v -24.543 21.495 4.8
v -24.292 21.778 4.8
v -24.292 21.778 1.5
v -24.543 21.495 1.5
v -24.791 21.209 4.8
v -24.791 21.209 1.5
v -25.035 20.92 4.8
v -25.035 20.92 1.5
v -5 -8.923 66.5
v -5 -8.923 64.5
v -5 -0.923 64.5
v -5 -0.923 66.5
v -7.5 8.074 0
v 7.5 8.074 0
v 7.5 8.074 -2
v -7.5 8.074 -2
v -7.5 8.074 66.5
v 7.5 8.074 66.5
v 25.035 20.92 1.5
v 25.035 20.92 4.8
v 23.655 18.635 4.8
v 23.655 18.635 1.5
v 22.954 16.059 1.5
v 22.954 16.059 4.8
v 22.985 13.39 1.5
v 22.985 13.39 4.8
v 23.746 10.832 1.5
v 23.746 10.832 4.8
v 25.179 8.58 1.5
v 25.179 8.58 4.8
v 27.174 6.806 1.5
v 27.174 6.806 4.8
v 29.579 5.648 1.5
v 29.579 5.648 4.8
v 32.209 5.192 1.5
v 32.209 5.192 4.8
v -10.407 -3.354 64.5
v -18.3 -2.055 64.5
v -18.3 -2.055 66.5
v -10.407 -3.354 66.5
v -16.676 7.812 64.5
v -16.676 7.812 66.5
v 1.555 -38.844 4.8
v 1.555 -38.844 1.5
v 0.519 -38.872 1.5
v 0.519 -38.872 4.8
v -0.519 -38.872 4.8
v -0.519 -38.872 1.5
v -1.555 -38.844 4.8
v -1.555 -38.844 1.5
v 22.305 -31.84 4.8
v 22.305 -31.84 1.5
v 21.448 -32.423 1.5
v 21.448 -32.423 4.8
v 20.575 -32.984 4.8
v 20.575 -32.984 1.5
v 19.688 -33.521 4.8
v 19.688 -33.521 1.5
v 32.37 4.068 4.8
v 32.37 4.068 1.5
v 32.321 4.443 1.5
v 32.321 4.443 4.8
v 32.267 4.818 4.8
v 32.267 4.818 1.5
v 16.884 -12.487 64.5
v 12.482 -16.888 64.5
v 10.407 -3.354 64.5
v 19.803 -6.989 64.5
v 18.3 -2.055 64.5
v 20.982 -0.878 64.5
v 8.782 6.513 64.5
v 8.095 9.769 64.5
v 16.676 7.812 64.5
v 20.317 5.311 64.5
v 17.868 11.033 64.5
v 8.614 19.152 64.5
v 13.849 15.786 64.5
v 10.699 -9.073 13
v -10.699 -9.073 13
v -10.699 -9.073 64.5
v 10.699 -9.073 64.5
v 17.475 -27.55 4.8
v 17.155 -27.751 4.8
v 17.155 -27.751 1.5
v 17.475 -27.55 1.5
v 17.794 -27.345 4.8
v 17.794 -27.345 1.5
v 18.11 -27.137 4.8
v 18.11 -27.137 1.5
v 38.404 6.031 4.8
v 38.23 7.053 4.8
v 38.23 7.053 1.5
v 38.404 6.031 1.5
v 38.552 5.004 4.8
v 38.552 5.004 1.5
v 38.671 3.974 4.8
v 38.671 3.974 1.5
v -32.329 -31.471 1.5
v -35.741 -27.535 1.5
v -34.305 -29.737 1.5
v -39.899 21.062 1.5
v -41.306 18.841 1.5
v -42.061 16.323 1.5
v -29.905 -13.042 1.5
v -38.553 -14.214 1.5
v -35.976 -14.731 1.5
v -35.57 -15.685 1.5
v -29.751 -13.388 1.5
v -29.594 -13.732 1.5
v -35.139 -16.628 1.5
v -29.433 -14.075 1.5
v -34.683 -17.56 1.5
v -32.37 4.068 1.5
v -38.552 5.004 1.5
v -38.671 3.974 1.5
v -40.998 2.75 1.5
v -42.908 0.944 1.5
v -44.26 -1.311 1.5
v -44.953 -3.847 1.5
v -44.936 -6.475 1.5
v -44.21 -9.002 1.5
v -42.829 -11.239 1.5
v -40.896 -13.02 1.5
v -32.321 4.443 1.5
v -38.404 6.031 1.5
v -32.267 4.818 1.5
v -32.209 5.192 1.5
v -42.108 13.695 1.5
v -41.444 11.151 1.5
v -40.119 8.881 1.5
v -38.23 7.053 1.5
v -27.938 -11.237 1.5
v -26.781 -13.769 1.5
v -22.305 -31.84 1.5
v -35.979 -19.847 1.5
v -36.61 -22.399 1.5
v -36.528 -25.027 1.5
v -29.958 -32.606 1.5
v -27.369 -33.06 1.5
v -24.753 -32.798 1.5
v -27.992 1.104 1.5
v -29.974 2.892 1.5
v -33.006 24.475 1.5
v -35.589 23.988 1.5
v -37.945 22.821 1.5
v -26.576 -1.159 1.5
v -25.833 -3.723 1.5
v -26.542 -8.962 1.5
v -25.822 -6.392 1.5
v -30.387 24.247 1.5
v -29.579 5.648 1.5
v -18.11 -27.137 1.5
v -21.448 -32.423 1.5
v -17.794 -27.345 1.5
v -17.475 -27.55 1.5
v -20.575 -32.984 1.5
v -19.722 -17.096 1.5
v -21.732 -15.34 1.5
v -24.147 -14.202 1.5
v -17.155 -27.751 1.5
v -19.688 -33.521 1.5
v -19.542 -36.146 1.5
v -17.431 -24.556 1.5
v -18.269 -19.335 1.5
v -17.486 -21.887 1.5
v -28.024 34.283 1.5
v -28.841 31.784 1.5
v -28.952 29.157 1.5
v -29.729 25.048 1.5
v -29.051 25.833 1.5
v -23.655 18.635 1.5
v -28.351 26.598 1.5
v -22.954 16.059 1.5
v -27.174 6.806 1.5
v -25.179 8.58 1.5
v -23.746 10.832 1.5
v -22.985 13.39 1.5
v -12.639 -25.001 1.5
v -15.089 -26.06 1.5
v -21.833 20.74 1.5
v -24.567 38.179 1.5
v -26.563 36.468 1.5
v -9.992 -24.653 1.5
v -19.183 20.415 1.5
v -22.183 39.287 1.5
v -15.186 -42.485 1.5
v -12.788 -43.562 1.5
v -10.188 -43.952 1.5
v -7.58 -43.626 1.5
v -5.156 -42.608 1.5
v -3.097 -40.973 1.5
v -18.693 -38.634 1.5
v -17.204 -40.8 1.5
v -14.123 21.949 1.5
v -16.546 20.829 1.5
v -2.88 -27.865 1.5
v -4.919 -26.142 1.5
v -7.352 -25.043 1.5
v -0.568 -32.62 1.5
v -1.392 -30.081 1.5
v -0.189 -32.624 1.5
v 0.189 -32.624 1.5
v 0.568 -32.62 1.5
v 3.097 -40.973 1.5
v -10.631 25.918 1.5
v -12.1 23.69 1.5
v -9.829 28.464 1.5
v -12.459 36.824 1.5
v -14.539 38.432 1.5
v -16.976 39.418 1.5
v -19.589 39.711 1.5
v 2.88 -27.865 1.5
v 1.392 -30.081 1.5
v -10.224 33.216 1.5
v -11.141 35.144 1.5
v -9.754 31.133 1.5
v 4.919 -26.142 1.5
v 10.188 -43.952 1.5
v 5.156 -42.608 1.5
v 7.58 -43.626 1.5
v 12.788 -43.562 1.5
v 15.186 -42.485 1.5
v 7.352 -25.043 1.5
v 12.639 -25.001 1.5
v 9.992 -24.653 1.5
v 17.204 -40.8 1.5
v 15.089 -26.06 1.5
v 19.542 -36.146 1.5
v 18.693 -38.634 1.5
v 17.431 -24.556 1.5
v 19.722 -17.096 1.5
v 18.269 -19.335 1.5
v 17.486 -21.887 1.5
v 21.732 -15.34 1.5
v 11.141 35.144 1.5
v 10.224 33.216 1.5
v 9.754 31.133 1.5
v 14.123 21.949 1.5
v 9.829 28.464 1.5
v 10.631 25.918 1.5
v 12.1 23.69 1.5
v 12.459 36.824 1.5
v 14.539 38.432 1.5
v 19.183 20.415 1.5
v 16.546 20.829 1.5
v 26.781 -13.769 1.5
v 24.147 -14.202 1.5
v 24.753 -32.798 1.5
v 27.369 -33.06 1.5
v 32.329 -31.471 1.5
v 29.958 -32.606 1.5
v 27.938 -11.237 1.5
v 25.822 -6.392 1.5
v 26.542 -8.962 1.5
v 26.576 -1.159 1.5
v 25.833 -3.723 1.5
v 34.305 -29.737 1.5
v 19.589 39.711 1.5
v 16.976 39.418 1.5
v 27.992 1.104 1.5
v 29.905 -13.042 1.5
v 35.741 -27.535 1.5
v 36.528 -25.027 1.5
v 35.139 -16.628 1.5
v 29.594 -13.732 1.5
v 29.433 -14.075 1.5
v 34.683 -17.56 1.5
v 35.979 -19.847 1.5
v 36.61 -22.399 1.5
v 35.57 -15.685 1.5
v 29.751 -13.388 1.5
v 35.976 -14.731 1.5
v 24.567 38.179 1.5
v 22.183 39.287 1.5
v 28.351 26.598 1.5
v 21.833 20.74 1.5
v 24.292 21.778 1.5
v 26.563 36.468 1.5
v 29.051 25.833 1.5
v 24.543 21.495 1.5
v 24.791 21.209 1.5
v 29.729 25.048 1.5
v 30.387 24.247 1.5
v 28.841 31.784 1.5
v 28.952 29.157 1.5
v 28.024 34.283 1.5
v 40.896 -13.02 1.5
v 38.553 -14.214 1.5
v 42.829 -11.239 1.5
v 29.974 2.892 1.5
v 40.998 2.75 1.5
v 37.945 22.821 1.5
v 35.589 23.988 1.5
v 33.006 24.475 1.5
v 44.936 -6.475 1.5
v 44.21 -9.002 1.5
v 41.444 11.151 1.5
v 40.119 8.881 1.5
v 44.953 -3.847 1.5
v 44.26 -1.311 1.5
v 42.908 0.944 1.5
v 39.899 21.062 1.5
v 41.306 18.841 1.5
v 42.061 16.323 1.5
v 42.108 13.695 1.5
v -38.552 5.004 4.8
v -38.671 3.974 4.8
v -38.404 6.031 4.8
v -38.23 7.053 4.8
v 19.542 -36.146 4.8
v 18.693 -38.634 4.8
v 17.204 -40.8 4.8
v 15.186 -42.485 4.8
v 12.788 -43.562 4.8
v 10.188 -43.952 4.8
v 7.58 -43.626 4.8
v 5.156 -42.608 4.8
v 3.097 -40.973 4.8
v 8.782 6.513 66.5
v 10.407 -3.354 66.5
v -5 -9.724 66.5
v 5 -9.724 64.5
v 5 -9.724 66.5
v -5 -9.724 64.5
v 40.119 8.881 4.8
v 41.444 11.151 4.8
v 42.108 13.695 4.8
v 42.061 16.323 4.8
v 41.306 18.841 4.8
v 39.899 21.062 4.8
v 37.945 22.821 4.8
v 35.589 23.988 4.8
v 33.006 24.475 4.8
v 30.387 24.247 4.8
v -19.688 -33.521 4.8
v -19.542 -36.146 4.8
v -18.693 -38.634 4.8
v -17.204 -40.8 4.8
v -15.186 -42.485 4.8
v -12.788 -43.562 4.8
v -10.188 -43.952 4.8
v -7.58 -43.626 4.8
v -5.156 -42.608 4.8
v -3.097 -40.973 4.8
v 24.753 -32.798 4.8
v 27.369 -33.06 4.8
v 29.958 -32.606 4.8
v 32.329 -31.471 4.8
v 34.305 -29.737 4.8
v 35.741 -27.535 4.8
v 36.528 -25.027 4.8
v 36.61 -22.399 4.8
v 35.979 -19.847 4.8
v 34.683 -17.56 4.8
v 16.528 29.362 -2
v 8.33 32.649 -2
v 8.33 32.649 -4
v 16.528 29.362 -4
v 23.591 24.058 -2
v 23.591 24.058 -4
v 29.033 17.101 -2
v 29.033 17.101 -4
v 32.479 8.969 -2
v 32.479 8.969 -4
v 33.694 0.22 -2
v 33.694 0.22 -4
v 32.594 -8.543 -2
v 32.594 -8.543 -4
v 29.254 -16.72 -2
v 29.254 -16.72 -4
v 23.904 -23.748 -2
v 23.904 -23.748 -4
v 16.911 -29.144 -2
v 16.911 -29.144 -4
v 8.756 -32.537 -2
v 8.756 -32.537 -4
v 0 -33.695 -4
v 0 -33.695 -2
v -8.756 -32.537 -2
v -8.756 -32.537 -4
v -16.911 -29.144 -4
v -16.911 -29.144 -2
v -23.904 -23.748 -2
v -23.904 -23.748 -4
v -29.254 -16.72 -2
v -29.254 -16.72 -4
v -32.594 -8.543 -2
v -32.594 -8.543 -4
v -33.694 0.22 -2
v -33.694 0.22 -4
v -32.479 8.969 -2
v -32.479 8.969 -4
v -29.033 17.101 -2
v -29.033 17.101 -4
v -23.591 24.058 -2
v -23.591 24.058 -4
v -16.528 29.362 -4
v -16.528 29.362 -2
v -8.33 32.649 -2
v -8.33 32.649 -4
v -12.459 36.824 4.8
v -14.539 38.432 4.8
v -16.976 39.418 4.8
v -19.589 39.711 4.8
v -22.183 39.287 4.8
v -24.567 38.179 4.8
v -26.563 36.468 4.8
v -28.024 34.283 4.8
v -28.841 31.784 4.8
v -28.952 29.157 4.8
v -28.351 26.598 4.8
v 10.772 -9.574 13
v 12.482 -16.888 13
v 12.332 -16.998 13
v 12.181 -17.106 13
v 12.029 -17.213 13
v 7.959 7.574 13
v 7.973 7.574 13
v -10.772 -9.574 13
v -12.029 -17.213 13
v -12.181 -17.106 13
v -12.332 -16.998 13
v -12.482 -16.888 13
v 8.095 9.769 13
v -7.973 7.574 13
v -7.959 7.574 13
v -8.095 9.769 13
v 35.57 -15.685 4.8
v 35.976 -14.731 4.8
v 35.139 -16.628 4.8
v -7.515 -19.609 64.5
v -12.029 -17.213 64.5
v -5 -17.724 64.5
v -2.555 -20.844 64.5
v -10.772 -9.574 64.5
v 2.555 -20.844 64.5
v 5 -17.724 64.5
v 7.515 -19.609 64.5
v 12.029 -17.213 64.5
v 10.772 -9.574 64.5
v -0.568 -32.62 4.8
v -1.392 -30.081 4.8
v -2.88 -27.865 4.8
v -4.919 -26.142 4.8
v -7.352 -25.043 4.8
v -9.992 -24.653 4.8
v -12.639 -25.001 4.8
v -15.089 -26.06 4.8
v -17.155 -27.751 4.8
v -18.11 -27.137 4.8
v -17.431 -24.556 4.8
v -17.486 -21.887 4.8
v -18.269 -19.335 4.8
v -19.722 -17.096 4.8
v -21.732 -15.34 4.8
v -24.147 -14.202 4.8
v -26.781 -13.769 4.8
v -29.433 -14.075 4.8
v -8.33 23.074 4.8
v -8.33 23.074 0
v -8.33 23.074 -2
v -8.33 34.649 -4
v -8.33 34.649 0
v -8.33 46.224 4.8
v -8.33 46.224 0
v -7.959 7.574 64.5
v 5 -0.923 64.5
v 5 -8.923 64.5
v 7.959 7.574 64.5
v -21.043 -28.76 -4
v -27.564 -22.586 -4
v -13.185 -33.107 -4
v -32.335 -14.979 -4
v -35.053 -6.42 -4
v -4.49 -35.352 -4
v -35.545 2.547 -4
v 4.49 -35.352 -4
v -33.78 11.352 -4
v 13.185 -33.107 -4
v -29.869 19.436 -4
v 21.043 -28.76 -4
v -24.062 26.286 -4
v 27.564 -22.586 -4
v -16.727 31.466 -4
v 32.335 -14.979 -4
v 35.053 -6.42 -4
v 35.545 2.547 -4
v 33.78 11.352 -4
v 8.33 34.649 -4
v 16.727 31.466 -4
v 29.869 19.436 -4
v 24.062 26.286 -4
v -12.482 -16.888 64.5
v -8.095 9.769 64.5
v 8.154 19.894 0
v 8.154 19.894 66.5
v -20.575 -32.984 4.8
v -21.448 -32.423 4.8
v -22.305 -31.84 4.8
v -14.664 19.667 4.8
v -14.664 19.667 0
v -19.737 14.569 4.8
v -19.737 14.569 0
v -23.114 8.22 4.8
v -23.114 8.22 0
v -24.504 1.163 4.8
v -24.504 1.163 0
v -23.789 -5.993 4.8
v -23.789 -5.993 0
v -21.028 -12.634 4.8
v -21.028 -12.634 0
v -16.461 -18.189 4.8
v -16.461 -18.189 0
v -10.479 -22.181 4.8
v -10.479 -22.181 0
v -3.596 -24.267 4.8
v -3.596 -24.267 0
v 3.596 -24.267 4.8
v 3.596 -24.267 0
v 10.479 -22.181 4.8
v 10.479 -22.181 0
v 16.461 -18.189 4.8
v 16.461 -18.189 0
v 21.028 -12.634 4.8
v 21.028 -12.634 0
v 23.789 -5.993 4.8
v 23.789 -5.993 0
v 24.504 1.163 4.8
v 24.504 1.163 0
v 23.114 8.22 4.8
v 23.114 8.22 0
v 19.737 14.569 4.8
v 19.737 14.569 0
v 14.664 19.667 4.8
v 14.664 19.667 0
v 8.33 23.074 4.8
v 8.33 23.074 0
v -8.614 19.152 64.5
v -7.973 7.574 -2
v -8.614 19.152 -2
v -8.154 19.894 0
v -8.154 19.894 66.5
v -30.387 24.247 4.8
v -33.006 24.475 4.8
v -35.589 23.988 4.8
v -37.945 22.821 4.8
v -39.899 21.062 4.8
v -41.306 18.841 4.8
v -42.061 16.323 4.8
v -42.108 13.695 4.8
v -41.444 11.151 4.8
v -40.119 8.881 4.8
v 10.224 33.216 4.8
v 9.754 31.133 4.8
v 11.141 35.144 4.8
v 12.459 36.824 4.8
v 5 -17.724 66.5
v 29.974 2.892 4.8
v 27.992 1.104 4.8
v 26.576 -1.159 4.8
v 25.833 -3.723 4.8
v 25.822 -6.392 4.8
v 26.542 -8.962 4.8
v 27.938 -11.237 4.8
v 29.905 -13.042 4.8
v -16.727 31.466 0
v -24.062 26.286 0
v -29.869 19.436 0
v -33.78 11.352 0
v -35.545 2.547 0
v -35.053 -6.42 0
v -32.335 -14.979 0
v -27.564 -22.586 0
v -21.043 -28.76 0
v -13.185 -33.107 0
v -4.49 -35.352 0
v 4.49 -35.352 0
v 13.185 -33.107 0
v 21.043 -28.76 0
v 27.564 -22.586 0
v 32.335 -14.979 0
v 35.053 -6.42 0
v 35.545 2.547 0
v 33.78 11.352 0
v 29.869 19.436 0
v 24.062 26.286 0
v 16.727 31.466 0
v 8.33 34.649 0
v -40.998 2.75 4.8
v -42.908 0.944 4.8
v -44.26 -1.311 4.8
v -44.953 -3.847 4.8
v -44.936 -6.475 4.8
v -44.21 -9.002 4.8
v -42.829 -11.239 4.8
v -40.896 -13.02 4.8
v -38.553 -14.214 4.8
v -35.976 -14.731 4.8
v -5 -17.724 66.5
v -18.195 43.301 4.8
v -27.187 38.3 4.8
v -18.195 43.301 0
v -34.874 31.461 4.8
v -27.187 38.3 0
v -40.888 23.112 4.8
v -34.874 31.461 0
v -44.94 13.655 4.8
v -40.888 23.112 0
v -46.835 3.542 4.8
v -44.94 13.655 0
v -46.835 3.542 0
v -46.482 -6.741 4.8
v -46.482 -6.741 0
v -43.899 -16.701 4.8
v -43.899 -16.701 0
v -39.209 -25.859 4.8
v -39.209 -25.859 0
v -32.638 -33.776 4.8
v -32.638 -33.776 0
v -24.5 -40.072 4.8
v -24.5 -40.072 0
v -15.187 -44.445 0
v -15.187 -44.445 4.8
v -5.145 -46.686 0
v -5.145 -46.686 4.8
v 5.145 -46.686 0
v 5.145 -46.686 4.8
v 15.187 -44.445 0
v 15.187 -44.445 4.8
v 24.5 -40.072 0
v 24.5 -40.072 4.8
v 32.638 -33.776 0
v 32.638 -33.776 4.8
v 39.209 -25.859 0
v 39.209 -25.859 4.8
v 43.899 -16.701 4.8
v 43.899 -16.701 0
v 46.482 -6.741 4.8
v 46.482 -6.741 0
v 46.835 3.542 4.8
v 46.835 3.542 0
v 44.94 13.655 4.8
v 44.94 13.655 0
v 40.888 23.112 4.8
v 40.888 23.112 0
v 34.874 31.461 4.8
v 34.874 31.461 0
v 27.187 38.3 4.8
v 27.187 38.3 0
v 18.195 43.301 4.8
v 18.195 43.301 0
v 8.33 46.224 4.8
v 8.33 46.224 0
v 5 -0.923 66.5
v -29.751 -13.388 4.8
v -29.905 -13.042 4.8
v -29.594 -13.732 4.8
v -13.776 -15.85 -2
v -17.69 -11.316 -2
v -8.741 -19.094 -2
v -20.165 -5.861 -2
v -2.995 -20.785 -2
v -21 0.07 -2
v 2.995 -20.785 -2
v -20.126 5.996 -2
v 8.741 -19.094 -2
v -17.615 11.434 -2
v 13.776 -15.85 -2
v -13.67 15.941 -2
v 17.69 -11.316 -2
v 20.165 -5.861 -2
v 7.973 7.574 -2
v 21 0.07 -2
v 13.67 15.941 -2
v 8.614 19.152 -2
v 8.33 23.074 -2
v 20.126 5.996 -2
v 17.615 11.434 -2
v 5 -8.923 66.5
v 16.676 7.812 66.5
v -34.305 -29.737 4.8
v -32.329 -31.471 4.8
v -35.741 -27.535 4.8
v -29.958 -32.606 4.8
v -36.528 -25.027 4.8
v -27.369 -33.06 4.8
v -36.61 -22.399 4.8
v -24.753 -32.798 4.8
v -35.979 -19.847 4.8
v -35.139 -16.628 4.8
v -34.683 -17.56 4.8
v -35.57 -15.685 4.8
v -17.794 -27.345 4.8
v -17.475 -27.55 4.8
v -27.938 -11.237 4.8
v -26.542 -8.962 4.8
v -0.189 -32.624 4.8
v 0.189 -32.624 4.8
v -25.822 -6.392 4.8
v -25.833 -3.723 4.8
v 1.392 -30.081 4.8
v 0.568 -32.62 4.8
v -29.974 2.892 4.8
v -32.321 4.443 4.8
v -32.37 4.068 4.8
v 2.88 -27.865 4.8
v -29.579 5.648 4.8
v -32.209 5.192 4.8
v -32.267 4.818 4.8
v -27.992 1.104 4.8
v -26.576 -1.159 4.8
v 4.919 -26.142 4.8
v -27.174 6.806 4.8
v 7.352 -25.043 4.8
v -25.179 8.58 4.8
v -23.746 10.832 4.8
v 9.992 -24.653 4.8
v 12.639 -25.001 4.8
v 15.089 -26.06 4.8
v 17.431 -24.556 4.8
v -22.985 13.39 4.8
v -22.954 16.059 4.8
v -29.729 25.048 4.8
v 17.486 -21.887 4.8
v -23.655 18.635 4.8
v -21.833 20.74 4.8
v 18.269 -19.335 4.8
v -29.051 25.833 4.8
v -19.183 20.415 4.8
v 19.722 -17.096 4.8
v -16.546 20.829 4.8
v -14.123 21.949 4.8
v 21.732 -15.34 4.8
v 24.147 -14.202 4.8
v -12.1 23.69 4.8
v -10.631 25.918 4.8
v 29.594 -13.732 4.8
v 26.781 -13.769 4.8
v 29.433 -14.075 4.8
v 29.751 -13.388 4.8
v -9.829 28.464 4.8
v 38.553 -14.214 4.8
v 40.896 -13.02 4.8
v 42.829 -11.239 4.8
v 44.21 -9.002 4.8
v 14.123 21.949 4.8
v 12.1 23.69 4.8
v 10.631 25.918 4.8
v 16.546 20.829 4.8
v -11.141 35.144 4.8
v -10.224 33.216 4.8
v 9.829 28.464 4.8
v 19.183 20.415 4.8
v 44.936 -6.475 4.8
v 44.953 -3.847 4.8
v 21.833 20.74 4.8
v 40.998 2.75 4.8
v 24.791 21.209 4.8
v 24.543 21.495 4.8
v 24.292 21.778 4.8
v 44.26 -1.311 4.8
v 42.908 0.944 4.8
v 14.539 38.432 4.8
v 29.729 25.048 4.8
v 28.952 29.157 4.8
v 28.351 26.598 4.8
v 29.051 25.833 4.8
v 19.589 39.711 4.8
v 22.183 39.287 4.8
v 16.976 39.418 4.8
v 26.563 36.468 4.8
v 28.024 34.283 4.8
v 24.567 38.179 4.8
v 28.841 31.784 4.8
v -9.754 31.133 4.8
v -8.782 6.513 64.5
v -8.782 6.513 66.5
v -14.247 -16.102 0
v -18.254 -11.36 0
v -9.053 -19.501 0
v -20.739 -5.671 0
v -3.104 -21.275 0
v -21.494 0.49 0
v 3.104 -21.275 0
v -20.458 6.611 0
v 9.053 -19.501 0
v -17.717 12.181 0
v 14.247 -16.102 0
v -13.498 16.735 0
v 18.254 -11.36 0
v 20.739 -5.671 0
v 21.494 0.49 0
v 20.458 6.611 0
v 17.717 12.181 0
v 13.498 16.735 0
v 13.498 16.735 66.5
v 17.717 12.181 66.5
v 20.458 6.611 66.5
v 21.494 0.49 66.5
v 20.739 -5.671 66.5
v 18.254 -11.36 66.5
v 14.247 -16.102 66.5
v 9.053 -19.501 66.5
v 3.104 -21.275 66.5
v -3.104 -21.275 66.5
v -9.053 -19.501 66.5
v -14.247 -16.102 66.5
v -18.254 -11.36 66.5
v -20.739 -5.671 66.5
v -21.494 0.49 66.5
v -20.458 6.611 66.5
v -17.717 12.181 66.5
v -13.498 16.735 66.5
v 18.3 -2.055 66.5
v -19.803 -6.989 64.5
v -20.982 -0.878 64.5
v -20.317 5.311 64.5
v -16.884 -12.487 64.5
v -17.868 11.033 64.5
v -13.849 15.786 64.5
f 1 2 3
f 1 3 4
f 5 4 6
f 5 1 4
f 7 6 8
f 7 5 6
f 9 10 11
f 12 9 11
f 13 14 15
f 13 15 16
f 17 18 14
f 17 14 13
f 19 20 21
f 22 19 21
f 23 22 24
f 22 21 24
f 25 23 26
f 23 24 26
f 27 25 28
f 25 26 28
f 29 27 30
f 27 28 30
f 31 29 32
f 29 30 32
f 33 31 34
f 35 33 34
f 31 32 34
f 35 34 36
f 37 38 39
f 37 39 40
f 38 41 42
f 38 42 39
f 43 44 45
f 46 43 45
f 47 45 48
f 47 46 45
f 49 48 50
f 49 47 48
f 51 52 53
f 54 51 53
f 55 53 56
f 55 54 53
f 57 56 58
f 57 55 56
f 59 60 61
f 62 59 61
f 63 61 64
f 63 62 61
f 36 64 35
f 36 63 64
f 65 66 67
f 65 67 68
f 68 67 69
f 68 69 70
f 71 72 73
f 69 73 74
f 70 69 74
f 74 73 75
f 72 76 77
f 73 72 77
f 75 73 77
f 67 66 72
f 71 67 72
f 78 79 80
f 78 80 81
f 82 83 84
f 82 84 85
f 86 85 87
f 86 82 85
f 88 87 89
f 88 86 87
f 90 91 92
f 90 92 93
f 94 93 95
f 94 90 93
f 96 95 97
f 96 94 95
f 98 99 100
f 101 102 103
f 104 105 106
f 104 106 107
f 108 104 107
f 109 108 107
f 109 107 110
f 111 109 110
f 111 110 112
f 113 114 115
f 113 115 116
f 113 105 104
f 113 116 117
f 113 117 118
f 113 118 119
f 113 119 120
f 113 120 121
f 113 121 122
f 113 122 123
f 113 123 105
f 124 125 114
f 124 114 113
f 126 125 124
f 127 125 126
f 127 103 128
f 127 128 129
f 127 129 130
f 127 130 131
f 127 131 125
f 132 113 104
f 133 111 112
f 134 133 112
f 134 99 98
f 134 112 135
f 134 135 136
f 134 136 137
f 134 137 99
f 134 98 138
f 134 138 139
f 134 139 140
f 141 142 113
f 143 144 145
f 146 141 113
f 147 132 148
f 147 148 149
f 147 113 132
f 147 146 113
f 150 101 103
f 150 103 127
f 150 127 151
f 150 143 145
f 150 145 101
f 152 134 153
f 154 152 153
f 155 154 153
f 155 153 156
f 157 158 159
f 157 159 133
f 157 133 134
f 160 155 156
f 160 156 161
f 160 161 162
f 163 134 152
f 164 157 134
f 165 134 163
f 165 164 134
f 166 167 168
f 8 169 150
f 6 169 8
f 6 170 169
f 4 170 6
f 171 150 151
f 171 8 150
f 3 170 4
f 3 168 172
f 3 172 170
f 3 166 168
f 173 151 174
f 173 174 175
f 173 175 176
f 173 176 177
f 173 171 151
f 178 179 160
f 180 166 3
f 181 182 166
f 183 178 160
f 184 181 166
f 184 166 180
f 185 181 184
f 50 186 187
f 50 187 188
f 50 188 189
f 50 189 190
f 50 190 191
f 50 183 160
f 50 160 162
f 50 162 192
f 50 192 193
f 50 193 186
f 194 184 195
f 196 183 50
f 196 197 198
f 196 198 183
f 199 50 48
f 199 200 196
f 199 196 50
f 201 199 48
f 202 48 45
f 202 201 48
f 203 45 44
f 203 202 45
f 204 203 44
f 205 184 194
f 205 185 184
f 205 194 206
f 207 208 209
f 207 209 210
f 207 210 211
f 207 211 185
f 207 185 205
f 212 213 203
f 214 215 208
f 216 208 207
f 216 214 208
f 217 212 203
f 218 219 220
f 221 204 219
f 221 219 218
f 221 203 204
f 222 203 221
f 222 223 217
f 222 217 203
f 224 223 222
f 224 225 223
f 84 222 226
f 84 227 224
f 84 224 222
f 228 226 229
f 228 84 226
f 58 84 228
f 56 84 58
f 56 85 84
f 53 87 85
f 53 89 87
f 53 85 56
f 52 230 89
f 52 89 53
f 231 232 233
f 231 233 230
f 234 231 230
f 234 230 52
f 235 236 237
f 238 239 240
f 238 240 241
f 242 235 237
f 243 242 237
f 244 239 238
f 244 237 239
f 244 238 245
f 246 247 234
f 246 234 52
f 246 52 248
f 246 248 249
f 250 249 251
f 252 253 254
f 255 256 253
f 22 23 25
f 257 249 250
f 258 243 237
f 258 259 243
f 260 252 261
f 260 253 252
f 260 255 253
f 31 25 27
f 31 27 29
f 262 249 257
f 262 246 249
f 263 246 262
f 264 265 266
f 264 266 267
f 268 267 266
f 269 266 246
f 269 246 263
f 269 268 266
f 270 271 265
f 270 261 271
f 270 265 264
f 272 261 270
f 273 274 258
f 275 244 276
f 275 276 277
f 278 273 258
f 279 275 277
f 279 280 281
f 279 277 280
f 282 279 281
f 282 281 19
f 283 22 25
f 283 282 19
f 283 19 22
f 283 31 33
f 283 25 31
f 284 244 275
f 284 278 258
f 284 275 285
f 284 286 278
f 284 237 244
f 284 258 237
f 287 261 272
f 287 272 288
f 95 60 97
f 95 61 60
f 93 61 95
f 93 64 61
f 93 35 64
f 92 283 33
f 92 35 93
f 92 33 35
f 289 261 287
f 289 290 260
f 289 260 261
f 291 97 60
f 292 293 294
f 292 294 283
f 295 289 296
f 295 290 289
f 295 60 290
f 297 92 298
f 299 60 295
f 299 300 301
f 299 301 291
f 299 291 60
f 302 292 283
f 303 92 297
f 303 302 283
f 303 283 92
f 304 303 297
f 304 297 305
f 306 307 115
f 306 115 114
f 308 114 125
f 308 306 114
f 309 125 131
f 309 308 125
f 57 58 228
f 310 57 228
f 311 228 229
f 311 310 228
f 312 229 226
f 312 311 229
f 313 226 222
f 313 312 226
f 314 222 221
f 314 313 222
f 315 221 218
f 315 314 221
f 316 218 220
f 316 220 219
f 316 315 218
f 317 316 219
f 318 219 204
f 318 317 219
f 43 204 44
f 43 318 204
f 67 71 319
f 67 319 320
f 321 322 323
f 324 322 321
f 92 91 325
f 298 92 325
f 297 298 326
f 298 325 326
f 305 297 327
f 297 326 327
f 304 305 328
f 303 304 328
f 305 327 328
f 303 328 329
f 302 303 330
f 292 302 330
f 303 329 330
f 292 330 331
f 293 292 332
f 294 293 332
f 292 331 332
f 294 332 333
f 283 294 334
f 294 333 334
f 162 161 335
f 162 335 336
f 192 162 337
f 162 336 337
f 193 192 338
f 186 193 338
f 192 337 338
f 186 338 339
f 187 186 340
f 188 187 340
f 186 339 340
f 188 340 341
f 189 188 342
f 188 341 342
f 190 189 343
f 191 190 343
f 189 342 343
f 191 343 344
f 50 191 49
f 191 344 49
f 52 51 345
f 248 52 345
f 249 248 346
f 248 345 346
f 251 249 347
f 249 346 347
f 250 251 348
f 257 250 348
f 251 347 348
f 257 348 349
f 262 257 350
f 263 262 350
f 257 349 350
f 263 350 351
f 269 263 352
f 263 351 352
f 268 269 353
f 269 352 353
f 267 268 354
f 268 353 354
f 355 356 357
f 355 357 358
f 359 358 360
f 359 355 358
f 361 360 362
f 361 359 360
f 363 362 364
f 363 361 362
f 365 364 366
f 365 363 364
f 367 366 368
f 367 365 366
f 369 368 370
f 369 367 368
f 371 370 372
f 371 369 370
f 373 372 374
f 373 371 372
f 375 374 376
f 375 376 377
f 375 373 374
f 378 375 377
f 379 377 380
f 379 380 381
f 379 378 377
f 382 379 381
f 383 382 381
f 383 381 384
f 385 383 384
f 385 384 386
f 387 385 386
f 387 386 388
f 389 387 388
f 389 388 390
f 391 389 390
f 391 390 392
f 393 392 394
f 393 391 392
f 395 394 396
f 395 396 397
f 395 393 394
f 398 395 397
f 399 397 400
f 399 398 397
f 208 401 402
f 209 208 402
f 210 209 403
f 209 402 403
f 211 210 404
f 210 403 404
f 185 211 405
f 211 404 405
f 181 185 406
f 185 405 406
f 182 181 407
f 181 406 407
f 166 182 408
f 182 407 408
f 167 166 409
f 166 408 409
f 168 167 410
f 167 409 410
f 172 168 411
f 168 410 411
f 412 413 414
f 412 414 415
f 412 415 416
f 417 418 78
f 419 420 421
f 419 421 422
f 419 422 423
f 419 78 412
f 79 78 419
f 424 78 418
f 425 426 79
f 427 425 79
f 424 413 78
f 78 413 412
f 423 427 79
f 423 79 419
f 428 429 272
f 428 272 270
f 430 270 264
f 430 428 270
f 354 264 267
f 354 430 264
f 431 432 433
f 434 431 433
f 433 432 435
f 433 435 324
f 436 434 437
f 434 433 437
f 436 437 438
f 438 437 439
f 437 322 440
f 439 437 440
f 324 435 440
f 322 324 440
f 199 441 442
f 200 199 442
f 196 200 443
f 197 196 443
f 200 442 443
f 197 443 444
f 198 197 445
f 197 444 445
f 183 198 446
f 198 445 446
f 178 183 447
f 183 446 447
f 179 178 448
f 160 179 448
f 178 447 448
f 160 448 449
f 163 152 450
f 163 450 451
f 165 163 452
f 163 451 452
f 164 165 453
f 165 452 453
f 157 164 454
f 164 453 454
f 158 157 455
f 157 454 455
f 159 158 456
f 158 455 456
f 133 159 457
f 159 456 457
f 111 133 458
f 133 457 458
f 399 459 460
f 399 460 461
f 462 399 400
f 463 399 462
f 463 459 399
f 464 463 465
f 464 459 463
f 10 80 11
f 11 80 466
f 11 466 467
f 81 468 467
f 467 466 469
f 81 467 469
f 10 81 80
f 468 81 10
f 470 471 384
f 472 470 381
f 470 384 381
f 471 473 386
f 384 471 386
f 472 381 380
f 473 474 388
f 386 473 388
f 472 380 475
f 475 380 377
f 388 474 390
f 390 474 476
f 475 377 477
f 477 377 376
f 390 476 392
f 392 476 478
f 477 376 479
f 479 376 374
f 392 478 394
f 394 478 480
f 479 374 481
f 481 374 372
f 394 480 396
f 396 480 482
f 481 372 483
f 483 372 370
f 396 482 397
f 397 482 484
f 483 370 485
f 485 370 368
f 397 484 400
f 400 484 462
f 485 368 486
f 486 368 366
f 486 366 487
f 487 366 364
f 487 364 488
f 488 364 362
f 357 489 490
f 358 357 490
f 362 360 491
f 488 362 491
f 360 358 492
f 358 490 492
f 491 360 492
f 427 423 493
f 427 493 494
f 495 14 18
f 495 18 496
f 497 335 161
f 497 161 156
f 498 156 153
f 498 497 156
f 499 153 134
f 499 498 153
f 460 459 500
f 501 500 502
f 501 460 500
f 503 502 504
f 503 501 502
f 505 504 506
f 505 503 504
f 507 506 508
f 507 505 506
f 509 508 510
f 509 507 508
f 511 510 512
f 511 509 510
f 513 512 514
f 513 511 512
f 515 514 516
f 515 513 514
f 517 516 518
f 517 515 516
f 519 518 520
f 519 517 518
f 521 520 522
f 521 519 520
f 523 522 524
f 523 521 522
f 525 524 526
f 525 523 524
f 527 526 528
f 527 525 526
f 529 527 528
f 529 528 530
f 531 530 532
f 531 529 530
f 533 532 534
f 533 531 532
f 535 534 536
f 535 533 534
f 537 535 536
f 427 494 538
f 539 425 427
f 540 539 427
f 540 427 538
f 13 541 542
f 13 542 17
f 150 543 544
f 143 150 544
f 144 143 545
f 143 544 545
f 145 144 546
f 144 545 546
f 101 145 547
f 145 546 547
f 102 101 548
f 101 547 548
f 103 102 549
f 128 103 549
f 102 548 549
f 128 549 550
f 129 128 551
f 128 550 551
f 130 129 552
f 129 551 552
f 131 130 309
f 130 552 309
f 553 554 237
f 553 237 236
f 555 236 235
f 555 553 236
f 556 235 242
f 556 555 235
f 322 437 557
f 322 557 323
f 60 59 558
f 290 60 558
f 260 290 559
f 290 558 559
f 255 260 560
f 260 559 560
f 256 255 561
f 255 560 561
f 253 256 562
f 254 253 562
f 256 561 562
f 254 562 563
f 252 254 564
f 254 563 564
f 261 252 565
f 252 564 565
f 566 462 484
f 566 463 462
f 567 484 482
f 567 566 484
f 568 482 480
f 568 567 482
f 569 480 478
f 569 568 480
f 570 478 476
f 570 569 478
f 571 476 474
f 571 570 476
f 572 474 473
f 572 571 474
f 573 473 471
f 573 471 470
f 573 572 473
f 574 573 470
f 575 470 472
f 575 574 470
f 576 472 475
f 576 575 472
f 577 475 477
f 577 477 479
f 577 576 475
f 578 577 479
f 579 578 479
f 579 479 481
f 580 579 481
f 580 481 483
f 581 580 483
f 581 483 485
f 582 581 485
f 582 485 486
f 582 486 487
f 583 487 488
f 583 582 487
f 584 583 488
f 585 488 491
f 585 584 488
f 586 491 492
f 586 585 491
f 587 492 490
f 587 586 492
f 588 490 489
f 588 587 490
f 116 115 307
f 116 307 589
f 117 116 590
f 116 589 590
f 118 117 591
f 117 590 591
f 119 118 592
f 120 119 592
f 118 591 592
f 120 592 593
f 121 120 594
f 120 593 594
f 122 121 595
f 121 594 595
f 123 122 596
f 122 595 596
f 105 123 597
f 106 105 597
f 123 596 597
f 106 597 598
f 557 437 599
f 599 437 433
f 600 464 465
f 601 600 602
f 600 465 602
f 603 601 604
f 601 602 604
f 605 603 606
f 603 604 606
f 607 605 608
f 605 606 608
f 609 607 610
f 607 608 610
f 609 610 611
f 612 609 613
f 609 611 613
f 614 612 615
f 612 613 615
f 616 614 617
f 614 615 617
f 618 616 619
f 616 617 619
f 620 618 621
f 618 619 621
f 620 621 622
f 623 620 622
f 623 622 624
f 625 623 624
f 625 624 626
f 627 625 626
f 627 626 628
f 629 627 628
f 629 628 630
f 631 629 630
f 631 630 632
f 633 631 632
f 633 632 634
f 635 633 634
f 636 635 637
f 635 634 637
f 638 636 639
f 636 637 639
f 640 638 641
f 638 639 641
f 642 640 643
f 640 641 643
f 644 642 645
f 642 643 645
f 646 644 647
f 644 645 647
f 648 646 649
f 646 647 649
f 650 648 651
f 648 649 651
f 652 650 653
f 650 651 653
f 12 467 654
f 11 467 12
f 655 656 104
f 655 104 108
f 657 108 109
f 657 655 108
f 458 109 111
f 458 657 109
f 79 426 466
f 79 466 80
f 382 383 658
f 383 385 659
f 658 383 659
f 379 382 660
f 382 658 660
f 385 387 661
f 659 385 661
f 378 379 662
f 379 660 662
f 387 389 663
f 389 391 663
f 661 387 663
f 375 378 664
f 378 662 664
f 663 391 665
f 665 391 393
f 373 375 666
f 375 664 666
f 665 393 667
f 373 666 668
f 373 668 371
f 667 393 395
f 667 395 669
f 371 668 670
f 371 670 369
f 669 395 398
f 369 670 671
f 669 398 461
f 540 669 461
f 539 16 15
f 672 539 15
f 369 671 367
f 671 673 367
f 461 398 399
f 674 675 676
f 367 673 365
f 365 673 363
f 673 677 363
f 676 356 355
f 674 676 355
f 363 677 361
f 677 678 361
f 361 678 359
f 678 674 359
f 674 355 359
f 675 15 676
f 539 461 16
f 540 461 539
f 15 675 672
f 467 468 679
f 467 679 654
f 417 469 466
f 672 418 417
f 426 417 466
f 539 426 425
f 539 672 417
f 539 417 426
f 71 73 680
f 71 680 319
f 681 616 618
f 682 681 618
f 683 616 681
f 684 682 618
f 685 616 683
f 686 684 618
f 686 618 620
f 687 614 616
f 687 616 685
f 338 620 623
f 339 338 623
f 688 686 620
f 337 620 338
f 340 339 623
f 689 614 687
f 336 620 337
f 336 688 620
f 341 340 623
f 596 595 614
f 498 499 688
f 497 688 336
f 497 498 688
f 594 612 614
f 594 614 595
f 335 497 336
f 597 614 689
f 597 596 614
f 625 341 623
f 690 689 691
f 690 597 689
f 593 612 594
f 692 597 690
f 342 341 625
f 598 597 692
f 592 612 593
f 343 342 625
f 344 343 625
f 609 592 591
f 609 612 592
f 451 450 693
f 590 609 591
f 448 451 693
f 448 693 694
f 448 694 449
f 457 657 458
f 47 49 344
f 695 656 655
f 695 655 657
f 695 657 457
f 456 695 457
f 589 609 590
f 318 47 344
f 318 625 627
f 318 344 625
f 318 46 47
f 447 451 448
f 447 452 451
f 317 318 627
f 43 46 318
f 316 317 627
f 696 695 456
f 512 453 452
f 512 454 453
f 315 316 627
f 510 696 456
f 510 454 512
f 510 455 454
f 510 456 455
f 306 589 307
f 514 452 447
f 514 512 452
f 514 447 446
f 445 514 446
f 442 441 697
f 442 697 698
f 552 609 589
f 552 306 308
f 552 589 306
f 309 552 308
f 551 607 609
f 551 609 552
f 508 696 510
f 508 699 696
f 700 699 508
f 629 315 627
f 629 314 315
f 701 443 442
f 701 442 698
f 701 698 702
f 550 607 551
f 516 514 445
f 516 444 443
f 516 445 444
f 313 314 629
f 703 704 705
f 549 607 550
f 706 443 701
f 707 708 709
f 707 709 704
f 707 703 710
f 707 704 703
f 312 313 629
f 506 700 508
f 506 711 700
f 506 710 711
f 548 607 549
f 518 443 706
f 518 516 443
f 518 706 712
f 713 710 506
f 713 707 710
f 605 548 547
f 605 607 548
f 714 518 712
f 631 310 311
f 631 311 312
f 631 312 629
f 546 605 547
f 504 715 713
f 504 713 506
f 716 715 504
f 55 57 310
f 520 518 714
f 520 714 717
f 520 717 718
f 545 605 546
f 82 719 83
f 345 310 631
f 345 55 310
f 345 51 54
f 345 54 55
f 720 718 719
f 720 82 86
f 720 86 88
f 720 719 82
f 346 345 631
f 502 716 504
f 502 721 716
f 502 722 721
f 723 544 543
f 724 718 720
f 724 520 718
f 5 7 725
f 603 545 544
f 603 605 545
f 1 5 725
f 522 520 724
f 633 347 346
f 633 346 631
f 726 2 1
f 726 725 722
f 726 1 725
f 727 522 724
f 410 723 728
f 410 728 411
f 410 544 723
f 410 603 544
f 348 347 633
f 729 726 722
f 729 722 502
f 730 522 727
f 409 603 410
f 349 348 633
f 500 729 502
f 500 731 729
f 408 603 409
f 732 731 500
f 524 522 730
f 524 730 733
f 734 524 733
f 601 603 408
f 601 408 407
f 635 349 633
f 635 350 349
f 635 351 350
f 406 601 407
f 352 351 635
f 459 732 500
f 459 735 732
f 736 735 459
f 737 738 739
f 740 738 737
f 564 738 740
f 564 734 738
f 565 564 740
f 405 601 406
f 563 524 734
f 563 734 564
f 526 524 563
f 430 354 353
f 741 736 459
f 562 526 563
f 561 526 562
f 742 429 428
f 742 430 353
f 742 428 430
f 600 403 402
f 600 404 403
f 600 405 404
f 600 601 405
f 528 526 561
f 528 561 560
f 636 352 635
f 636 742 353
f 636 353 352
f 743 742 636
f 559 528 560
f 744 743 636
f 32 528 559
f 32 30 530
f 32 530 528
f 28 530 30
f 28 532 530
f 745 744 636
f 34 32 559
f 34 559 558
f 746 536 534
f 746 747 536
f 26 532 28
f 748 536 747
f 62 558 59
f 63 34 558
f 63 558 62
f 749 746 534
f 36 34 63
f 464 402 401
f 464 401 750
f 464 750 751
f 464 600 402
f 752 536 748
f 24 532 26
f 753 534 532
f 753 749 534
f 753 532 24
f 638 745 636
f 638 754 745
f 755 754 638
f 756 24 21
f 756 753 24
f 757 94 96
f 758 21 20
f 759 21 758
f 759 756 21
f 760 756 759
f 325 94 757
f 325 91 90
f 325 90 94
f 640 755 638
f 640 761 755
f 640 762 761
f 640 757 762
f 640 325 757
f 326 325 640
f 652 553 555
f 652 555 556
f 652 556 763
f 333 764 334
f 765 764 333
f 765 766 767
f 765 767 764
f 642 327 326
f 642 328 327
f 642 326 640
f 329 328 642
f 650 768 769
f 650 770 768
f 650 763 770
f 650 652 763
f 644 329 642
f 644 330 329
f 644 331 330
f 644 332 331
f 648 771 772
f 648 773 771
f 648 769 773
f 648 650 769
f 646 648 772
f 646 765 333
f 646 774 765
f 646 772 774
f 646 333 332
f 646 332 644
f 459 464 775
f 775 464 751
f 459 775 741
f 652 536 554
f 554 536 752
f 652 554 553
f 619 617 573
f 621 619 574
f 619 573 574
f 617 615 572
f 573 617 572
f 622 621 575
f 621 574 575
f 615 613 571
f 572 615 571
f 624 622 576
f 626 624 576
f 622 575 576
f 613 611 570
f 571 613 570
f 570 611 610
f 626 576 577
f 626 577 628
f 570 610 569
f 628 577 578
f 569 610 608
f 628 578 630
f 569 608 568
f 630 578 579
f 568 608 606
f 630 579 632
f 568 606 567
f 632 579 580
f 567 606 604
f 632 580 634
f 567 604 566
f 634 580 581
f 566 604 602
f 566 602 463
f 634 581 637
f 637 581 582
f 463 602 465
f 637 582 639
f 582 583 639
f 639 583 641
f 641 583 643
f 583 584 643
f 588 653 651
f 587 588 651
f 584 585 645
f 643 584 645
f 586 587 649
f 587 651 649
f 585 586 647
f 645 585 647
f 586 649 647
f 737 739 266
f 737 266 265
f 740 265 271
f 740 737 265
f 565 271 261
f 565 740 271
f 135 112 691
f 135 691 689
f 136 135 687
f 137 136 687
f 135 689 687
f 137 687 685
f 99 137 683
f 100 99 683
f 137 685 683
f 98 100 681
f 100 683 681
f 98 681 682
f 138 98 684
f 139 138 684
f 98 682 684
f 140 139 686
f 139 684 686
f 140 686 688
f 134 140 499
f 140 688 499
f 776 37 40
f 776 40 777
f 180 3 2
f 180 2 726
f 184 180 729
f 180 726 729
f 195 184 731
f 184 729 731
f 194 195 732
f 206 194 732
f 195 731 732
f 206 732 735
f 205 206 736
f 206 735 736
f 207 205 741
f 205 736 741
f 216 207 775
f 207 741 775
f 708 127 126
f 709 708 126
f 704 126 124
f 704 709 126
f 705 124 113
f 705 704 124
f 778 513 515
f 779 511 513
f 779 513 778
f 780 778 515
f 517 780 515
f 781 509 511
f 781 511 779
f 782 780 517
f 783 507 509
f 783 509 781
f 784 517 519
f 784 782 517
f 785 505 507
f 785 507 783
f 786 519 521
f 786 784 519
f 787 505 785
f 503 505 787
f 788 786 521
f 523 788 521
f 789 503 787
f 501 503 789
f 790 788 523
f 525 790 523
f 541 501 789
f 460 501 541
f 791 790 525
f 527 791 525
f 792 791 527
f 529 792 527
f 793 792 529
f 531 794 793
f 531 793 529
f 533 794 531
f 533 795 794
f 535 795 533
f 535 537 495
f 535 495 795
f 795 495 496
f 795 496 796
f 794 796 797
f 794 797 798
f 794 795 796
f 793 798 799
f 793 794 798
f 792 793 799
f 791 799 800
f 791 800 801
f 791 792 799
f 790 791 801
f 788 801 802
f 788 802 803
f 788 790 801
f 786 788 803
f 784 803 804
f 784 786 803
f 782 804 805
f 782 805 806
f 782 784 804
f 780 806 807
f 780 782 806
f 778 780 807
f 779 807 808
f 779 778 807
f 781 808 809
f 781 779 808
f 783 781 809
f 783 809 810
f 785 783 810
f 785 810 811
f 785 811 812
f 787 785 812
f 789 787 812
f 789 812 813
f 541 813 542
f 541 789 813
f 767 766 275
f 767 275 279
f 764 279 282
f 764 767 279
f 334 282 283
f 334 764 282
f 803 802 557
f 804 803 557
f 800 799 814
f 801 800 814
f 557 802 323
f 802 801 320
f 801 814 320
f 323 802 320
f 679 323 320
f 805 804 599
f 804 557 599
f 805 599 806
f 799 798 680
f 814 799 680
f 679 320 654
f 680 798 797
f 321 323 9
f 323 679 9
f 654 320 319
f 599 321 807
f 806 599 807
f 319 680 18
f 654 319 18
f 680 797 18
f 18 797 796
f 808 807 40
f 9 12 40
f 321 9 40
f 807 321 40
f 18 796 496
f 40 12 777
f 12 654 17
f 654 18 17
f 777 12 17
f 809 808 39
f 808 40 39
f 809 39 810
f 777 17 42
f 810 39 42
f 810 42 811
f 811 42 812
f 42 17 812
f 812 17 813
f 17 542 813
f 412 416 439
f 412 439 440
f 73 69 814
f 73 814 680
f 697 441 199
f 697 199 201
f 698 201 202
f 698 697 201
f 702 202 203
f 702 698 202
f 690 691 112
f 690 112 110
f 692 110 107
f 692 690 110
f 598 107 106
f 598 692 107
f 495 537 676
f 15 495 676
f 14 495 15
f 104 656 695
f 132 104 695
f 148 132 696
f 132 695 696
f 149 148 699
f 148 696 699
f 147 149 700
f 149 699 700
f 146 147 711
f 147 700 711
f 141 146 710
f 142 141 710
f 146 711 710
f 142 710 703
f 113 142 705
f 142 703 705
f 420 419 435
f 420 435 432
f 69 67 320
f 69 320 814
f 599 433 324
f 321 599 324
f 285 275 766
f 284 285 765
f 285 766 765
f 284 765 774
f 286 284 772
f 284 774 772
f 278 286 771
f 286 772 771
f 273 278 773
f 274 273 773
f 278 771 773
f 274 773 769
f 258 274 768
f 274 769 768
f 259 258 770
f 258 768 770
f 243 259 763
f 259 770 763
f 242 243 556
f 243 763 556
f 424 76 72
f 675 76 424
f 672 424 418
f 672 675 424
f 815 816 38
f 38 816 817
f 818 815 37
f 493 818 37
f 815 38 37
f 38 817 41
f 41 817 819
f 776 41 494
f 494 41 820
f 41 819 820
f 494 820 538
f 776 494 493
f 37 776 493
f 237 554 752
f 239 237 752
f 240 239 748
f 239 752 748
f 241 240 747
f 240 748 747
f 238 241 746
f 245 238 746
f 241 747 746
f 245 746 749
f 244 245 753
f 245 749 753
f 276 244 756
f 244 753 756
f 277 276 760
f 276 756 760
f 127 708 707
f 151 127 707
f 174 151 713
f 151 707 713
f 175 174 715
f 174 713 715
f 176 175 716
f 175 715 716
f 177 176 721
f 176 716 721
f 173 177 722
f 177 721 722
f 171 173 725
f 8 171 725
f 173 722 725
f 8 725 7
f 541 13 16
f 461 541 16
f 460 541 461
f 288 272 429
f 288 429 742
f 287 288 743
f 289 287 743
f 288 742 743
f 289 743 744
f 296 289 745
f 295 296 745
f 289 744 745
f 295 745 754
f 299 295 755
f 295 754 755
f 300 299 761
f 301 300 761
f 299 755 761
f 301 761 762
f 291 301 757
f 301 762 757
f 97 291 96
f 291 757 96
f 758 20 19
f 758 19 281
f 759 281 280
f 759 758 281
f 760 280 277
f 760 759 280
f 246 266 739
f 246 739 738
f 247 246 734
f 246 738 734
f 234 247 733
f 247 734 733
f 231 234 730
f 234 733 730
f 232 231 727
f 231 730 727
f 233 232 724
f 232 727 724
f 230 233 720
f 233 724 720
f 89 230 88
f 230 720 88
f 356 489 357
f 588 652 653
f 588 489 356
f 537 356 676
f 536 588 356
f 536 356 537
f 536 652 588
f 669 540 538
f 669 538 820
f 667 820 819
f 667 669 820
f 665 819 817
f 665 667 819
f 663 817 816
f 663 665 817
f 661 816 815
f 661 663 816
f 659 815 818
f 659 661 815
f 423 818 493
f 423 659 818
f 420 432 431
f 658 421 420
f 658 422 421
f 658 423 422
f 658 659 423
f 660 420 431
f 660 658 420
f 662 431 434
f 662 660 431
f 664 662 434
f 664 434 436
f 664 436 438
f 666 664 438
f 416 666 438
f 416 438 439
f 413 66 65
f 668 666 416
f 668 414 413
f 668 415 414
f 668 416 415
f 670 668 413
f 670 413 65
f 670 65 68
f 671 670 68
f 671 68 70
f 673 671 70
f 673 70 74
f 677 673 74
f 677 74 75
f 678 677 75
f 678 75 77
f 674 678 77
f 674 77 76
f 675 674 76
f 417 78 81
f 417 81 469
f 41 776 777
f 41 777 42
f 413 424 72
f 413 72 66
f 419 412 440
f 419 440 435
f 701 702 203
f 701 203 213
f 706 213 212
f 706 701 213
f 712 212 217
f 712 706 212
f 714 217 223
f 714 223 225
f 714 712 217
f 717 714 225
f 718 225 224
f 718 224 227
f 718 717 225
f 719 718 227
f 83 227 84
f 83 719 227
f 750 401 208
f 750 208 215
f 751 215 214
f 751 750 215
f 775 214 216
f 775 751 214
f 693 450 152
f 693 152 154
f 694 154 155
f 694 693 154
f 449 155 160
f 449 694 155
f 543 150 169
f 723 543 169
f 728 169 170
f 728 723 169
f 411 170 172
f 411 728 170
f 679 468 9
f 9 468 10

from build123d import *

# Parameters (mm, degrees)
BASIC_SHAPE_SKETCH_R                = 46.96825
BASIC_SHAPE_SKETCH_R_2              = 24.53175
BASIC_SHAPE_DEPTH                   = 4.8
BATTERY_SLOT_SKETCH_R               = 9.65
BATTERY_SLOT_DEPTH                  = 3.3
BATTERY_SLOT_PATTERN_COUNT          = 5
BATTERY_SLOT_PATTERN_ANGLE          = 130.88
BATTERY_SLOT_MIRROR_COPY_1_SKETCH_R = 9.65
BATTERY_SLOT_MIRROR_COPY_1_DEPTH    = 3.3
BATTERY_SLOT_MIRROR_COPY_2_SKETCH_R = 9.65
BATTERY_SLOT_MIRROR_COPY_2_DEPTH    = 3.3
BATTERY_SLOT_MIRROR_COPY_3_SKETCH_R = 9.65
BATTERY_SLOT_MIRROR_COPY_3_DEPTH    = 3.3
BATTERY_SLOT_MIRROR_COPY_4_SKETCH_R = 9.65
BATTERY_SLOT_MIRROR_COPY_4_DEPTH    = 3.3
SLIT_DEPTH                          = 67.596343865
BUS_SLIT_DEPTH                      = 3.3
CAP_2_DEPTH                         = 2
PLUNGER_DEPTH                       = 66.5
PLUNGER_CAVITY_DEPTH                = 66.5
LIP_DEPTH                           = 2
EXTRA_CUT_DEPTH                     = 94.990866663
BARRIERS_DEPTH                      = 51.5
SKETCH15_W                          = 10
SKETCH15_H                          = 8
CUT_EXTRUDE6_DEPTH                  = 96.416366605


with BuildPart() as part:
    # Basic_Shape_Sketch → Basic_Shape (new body)
    with BuildSketch(Plane.XY):
        Circle(BASIC_SHAPE_SKETCH_R)
        Circle(BASIC_SHAPE_SKETCH_R_2, mode=Mode.SUBTRACT)
    extrude(amount=BASIC_SHAPE_DEPTH)

    # Battery_Slot_Sketch → Battery_Slot (cut)
    with BuildSketch(Plane.XY.offset(4.8)):
        with Locations((-10.069761866, -34.302512969)):
            Circle(BATTERY_SLOT_SKETCH_R)
    battery_slot = extrude(amount=-BATTERY_SLOT_DEPTH, mode=Mode.SUBTRACT)

    # Battery_Slot_Pattern: Battery_Slot ×5 about axis
    battery_slot_pattern_axis = Axis((0, 0, 0), (0, 0, -1))
    for i in range(1, BATTERY_SLOT_PATTERN_COUNT):
        add(battery_slot.rotate(battery_slot_pattern_axis, i * BATTERY_SLOT_PATTERN_ANGLE / (BATTERY_SLOT_PATTERN_COUNT - 1)), mode=Mode.SUBTRACT)

    # Battery_Slot_Mirror: Battery_Slot across plane
    add(battery_slot.mirror(Plane(origin=(0, 0, 0), x_dir=(0, 0, 1), z_dir=(1, 0, 0))), mode=Mode.SUBTRACT)

    # Battery_Slot_Mirror copy 1 sketch → Battery_Slot_Mirror copy 1 (cut)
    with BuildSketch(Plane(origin=(0, 0, 4.8), x_dir=(-0.8413221512344797, -0.5405340302350882, 0), z_dir=(0, 0, 1))):
        with Locations((-10.069761866, 34.302512969)):
            Circle(BATTERY_SLOT_MIRROR_COPY_1_SKETCH_R)
    extrude(amount=-BATTERY_SLOT_MIRROR_COPY_1_DEPTH, mode=Mode.SUBTRACT)

    # Battery_Slot_Mirror copy 2 sketch → Battery_Slot_Mirror copy 2 (cut)
    with BuildSketch(Plane(origin=(0, 0, 4.8), x_dir=(-0.4156459243156256, -0.9095265062656553, 0), z_dir=(0, 0, 1))):
        with Locations((-10.069761866, 34.302512969)):
            Circle(BATTERY_SLOT_MIRROR_COPY_2_SKETCH_R)
    extrude(amount=-BATTERY_SLOT_MIRROR_COPY_2_DEPTH, mode=Mode.SUBTRACT)

    # Battery_Slot_Mirror copy 3 sketch → Battery_Slot_Mirror copy 3 (cut)
    with BuildSketch(Plane(origin=(0, 0, 4.8), x_dir=(0.14193790484034807, -0.9898755634773152, 0), z_dir=(0, 0, 1))):
        with Locations((-10.069761866, 34.302512969)):
            Circle(BATTERY_SLOT_MIRROR_COPY_3_SKETCH_R)
    extrude(amount=-BATTERY_SLOT_MIRROR_COPY_3_DEPTH, mode=Mode.SUBTRACT)

    # Battery_Slot_Mirror copy 4 sketch → Battery_Slot_Mirror copy 4 (cut)
    with BuildSketch(Plane(origin=(0, 0, 4.8), x_dir=(0.6544769311996185, -0.7560819707726999, 0), z_dir=(0, 0, 1))):
        with Locations((-10.069761866, 34.302512969)):
            Circle(BATTERY_SLOT_MIRROR_COPY_4_SKETCH_R)
    extrude(amount=-BATTERY_SLOT_MIRROR_COPY_4_DEPTH, mode=Mode.SUBTRACT)

    # Slit_Sketch → Slit (cut, through all)
    with BuildSketch(Plane.XY.offset(4.8)):
        with BuildLine():
            Line((-8.33, 46.223669349), (-8.33, 23.074181634))
            Line((-8.33, 23.074181634), (8.33, 23.074181634))
            Line((8.33, 23.074181634), (8.33, 46.223669349))
            ThreePointArc((8.33, 46.223669349), (0, 54.553669349), (-8.33, 46.223669349))
        make_face()
    extrude(amount=-SLIT_DEPTH, mode=Mode.SUBTRACT)

    # Bus_Slit_Sketch → Bus_Slit (cut)
    with BuildSketch(Plane.XY.offset(4.8)):
        with BuildLine():
            ThreePointArc((-9.754463235, 31.132636766), (0, -32.625), (9.754463235, 31.132636766))
            ThreePointArc((9.754463235, 31.132636766), (10.629095474, 34.20551129), (12.459123069, 36.824392423))
            ThreePointArc((12.459123069, 36.824392423), (0, -38.875), (-12.459123069, 36.824392423))
            ThreePointArc((-12.459123069, 36.824392423), (-10.629095474, 34.20551129), (-9.754463235, 31.132636766))
        make_face()
    extrude(amount=-BUS_SLIT_DEPTH, mode=Mode.SUBTRACT)

    # Cap_2_Sketch → Cap_2 (add)
    with BuildSketch(Plane(origin=(0, 0, 0), x_dir=(-1, 0, 0), z_dir=(0, 0, -1))):
        with BuildLine():
            Line((-8.33, 34.648925491), (-8.33, 23.074181634))
            Line((-8.33, 23.074181634), (8.33, 23.074181634))
            Line((8.33, 23.074181634), (8.33, 34.648925491))
            ThreePointArc((8.33, 34.648925491), (0, -35.636174566), (-8.33, 34.648925491))
        make_face()
    extrude(amount=CAP_2_DEPTH)

    # Sketch1 → Plunger (add)
    with BuildSketch(Plane.XY):
        with BuildLine():
            Line((-7.5, 8.074181634), (7.5, 8.074181634))
            Line((7.5, 8.074181634), (8.154017112, 19.893767993))
            ThreePointArc((8.154017112, 19.893767993), (0, -21.5), (-8.154017112, 19.893767993))
            Line((-8.154017112, 19.893767993), (-7.5, 8.074181634))
        make_face()
    extrude(amount=PLUNGER_DEPTH)

    # Sketch11 → Plunger Cavity (cut)
    with BuildSketch(Plane(origin=(0, 0, -2), x_dir=(-1, 0, 0), z_dir=(0, 0, -1))):
        with BuildLine():
            Line((-8.61374371, 19.152112659), (-7.973098193, 7.574181634))
            Line((-7.973098193, 7.574181634), (7.973098193, 7.574181634))
            Line((7.973098193, 7.574181634), (8.61374371, 19.152112659))
            ThreePointArc((8.61374371, 19.152112659), (0, -21), (-8.61374371, 19.152112659))
        make_face()
    extrude(amount=-PLUNGER_CAVITY_DEPTH, mode=Mode.SUBTRACT)

    # Sketch10 → Lip (add)
    with BuildSketch(Plane(origin=(0, 0, -2), x_dir=(-1, 0, 0), z_dir=(0, 0, -1))):
        with BuildLine():
            Line((-8.33, 34.648925491), (-8.33, 32.648925491))
            ThreePointArc((-8.33, 32.648925491), (0, -33.694825059), (8.33, 32.648925491))
            Line((8.33, 32.648925491), (8.33, 34.648925491))
            ThreePointArc((8.33, 34.648925491), (0, -35.636174566), (-8.33, 34.648925491))
        make_face()
    extrude(amount=LIP_DEPTH)

    # Sketch12 → Extra_Cut (cut, through all)
    with BuildSketch(Plane.XY):
        Polygon((-7.5, 8.074181634), (-8.33, 23.074181634), (8.33, 23.074181634), (7.5, 8.074181634), align=None)
    extrude(amount=-EXTRA_CUT_DEPTH, mode=Mode.SUBTRACT)

    # Sketch14 → Barriers (add)
    with BuildSketch(Plane(origin=(0, 0, 13), x_dir=(-1, 0, 0), z_dir=(0, 0, -1))):
        with BuildLine():
            Line((-8.094524385, 9.768630899), (-12.482303066, -16.88763187))
            ThreePointArc((-12.482303066, -16.88763187), (-12.256826493, -17.051985349), (-12.029186165, -17.213328562))
            Line((-12.029186165, -17.213328562), (-10.771652468, -9.573665961))
            Line((-10.771652468, -9.573665961), (10.771652468, -9.573665961))
            Line((10.771652468, -9.573665961), (12.029186165, -17.213328562))
            ThreePointArc((12.029186165, -17.213328562), (12.256826493, -17.051985349), (12.482303066, -16.88763187))
            Line((12.482303066, -16.88763187), (8.094524385, 9.768630899))
            Line((8.094524385, 9.768630899), (7.959093124, 7.574181634))
            Line((7.959093124, 7.574181634), (10.699314208, -9.072978255))
            Line((10.699314208, -9.072978255), (-10.699314208, -9.072978255))
            Line((-10.699314208, -9.072978255), (-7.959093124, 7.574181634))
            Line((-7.959093124, 7.574181634), (-8.094524385, 9.768630899))
        make_face()
    extrude(amount=-BARRIERS_DEPTH)

    # Sketch15 → Cut-Extrude6 (cut, through all)
    with BuildSketch(Plane(origin=(0, 0, 64.5), x_dir=(-1, 0, 0), z_dir=(0, 0, -1))):
        Polygon((-16.676224256, 7.812290296), (-8.782450836, 6.512928453), (-10.40665314, -3.354288322), (-18.30042656, -2.054926479), align=None)
        Polygon((8.782450836, 6.512928453), (16.676224256, 7.812290296), (18.30042656, -2.054926479), (10.40665314, -3.354288322), align=None)
        with Locations((0, -4.922978255)):
            Rectangle(SKETCH15_W, SKETCH15_H)
        with Locations((0, -13.723665961)):
            Rectangle(SKETCH15_W, SKETCH15_H)
    extrude(amount=-CUT_EXTRUDE6_DEPTH, mode=Mode.SUBTRACT)


solid = part.part
